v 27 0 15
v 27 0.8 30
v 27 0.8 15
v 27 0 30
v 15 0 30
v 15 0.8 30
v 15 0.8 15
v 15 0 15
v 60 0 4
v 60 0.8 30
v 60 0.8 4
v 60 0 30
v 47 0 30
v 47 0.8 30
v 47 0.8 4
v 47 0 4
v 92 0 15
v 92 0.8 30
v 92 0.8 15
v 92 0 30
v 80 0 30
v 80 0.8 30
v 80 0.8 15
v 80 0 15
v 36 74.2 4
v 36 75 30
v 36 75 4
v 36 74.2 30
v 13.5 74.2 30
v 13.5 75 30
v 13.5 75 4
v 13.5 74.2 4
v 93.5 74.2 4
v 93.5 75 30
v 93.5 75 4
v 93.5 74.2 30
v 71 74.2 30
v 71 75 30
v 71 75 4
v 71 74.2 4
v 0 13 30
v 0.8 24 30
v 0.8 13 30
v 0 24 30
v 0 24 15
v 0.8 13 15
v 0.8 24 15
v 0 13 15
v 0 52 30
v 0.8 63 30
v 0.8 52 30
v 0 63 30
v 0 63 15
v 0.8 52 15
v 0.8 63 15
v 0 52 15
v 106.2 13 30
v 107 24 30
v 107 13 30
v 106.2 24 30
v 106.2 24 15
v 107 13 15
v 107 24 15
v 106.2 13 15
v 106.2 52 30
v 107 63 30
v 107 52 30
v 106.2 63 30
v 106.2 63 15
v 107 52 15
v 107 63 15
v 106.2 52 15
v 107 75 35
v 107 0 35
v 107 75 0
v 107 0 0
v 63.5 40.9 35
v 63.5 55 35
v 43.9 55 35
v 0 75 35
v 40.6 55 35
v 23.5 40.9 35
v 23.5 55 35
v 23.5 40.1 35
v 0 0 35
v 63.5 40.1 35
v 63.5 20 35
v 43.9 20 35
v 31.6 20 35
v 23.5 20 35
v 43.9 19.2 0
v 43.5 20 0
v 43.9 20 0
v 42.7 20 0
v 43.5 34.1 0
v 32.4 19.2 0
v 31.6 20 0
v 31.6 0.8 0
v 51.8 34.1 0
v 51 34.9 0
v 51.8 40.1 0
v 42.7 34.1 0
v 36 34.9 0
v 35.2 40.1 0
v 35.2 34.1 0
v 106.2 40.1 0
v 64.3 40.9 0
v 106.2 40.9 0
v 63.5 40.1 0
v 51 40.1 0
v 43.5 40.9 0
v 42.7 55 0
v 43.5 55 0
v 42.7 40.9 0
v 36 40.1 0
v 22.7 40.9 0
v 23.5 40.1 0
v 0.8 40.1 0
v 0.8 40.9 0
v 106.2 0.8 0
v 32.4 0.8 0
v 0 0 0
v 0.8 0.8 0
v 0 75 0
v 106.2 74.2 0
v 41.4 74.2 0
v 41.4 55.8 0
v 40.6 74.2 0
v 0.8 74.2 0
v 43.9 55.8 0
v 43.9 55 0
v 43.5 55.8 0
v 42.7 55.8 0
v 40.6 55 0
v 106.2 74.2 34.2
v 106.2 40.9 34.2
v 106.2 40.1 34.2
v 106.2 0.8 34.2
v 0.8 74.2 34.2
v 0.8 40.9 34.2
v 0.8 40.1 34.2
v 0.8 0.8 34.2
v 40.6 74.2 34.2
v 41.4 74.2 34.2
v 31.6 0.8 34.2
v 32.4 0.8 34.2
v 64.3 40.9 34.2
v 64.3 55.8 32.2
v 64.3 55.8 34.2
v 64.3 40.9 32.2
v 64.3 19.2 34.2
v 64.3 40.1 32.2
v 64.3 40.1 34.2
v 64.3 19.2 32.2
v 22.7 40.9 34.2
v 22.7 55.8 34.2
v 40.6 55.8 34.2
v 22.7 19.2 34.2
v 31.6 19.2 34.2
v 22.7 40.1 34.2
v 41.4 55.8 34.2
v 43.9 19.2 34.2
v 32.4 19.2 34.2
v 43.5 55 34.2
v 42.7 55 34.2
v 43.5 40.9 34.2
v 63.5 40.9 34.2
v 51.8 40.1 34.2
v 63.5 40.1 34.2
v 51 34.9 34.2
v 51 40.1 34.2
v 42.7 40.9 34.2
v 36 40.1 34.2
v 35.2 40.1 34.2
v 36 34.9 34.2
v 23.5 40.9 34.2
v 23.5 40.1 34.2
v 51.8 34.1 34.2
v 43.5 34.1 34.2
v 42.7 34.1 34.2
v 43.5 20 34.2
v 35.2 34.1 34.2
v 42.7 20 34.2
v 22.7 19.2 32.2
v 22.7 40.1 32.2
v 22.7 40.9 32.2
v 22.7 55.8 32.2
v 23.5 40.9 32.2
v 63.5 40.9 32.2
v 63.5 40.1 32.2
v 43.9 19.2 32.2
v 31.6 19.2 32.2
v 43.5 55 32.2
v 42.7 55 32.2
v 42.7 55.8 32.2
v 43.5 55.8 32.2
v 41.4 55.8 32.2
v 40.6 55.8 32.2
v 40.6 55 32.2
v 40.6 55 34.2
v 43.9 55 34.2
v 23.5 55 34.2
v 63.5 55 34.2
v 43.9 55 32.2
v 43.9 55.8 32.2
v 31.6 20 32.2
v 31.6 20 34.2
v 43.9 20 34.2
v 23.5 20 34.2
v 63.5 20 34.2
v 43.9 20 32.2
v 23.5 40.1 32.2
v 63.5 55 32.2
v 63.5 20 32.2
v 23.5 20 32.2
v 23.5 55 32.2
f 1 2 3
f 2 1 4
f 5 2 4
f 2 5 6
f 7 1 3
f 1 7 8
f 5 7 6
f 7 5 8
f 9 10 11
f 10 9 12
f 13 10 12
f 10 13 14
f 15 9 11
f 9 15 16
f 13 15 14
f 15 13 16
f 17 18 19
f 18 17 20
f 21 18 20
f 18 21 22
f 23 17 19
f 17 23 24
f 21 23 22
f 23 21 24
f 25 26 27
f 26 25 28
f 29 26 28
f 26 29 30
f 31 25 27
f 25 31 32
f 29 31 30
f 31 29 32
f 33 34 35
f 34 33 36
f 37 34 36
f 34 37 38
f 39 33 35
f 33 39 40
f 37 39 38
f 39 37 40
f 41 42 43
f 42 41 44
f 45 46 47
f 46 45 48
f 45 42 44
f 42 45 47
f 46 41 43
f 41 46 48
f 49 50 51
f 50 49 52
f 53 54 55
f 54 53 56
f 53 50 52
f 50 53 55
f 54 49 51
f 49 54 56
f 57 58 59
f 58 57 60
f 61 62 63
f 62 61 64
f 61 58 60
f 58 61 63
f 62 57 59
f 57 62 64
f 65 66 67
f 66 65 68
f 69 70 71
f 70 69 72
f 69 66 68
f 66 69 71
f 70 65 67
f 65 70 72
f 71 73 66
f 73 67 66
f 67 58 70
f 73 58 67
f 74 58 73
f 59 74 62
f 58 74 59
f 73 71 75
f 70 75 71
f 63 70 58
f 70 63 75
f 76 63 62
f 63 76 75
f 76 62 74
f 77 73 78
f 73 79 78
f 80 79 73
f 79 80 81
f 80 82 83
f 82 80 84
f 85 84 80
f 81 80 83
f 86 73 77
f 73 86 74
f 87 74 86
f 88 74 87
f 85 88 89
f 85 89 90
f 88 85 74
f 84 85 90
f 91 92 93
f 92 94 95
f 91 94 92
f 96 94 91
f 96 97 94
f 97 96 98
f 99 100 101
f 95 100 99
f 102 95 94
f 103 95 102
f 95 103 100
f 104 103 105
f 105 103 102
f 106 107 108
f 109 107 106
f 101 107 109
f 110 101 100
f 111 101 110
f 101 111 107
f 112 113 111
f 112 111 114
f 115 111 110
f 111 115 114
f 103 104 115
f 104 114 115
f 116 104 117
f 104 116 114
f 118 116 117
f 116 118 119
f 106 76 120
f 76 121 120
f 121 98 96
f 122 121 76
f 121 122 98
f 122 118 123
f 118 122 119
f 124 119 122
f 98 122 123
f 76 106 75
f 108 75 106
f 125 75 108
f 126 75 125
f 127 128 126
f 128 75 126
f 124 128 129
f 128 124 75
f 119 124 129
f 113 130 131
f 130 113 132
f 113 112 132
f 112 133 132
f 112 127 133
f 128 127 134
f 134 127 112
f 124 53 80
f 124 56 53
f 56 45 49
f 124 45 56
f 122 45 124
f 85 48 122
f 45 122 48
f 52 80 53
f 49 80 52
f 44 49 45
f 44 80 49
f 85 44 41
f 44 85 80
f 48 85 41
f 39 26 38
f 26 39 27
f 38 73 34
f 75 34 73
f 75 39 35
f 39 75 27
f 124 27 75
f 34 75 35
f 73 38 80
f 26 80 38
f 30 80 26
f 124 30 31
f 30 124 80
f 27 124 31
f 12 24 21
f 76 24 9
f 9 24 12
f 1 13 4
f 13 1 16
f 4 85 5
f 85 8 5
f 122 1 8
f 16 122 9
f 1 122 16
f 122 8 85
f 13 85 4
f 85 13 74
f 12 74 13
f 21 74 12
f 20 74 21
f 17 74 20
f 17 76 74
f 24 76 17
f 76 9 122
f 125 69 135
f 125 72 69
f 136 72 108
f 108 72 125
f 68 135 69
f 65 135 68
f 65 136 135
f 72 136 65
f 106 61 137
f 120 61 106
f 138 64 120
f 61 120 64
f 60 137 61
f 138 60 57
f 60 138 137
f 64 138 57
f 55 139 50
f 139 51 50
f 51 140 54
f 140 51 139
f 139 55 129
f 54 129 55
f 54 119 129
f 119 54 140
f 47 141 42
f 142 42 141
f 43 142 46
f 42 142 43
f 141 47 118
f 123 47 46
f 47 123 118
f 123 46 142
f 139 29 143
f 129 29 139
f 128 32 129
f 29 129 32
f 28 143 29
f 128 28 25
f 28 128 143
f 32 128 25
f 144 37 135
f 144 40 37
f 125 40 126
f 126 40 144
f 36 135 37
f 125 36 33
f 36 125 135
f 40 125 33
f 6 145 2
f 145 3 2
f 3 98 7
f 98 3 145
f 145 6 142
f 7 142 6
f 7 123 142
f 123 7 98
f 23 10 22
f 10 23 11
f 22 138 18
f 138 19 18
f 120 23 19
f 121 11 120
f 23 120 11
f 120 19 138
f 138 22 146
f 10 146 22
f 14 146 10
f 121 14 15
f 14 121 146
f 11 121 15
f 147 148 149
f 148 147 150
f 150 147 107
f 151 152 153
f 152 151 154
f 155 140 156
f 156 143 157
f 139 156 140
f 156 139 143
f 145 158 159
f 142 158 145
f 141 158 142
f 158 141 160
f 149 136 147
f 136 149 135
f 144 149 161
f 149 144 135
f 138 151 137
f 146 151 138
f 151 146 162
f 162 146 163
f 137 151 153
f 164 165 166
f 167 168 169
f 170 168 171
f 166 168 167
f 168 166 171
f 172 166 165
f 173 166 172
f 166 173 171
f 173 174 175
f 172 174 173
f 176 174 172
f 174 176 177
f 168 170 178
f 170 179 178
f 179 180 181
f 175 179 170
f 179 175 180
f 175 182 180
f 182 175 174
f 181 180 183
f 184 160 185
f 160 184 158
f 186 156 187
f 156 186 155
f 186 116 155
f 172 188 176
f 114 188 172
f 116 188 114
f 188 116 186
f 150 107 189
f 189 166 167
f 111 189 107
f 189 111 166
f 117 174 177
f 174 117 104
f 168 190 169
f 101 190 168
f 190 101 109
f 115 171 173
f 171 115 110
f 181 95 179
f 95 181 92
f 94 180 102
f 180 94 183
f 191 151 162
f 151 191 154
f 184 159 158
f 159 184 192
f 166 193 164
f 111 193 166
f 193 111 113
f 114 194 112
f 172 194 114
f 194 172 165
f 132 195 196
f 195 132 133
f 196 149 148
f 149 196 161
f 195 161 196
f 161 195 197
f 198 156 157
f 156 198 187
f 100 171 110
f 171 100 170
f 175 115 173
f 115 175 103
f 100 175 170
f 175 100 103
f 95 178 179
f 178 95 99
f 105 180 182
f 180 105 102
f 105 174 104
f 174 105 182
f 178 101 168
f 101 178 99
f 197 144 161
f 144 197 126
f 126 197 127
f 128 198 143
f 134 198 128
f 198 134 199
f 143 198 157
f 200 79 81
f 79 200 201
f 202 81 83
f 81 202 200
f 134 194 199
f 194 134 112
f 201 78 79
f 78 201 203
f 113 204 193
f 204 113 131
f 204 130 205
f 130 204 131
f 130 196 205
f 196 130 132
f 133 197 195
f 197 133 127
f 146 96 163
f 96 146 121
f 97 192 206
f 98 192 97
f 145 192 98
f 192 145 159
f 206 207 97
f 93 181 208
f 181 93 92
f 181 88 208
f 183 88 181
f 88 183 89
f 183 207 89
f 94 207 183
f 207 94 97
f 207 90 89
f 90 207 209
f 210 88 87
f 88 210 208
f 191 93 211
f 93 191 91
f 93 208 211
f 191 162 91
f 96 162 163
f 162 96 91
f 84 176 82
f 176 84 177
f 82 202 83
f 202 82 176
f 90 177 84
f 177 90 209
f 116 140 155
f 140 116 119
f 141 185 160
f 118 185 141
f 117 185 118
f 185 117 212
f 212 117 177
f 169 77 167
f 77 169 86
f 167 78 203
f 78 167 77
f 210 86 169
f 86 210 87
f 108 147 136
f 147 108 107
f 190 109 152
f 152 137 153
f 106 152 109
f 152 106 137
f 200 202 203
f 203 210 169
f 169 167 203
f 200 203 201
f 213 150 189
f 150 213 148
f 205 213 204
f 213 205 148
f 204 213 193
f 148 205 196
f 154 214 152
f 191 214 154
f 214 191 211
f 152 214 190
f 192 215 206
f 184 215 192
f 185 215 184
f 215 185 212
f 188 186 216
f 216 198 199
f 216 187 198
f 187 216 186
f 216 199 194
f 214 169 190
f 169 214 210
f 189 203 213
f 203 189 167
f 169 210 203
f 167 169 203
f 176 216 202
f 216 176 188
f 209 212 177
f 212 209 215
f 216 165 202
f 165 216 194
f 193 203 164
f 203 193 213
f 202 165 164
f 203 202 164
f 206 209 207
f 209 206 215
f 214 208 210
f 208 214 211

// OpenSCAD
// file: house_data.scad
room_width  = 107;
room_depth  = 75;
room_height = 35;
front_windows  = [[15,15,12,15], [47,4,13,26], [80,15,12,15]];
back_windows   = [[13.5,4,22.5,26], [71,4,22.5,26]];
left_windows   = [[13,15,11,15], [52,15,11,15]];
right_windows  = [[13,15,11,15], [52,15,11,15]];
has_licht      = true;
licht_offset   = [-10, 0];
licht_rotation = 0;
dach           = [];
front_wall_pos = [32];
back_wall_pos  = [41];
left_wall_pos  = [40.5];
right_wall_pos = [40.5];
// main file
// Hausmaske mit Fenster- und Türöffnungen aus CSV-Daten
// Aufruf: python3 parse_house.py sample.csv > house_data.scad
// Dann diese Datei in OpenSCAD öffnen.

include <house_data.scad>

wall_t     = 0.8;   // Wandstärke [mm]
licht_w    = 40;  // Dachausschnitt Breite [mm]
licht_d    = 35;  // Dachausschnitt Tiefe [mm]
board_slot = 3;   // Versatz der X-Wand vom Mittelpunkt [mm]
board_cap  = 15;  // Breite der kurzen Querwand [mm]

licht_x = (room_width - licht_w) / 2 + licht_offset[0];
licht_y = (room_depth - licht_d) / 2 + licht_offset[1];

licht_cx = licht_x + licht_w / 2;
licht_cy = licht_y + licht_d / 2;

module licht_transform() {
    translate([licht_cx, licht_cy, 0])
        rotate([0, 0, licht_rotation])
            translate([-licht_cx, -licht_cy, 0])
                children();
}

// Alle Öffnungen einer Wand als Subtraktionskörper.
// windows = [[x_start, y_start, x_size, y_size], ...]
// x = Position entlang der Wandlänge (von links außen), y = Höhe ab Boden
module front_cuts(windows) {
    for (w = windows)
        translate([w[0], -0.1, w[1]])
            cube([w[2], wall_t + 0.2, w[3]]);
}
module back_cuts(windows) {
    for (w = windows)
        translate([w[0], room_depth - wall_t - 0.1, w[1]])
            cube([w[2], wall_t + 0.2, w[3]]);
}
module left_cuts(windows) {
    for (w = windows)
        translate([-0.1, w[0], w[1]])
            cube([wall_t + 0.2, w[2], w[3]]);
}
module right_cuts(windows) {
    for (w = windows)
        translate([room_width - wall_t - 0.1, w[0], w[1]])
            cube([wall_t + 0.2, w[2], w[3]]);
}

// Dachausschnitte: [[x, y, breite, tiefe], ...] – Ursprung vorne links
module dach_cuts() {
    for (d = dach)
        translate([d[0], d[1], room_height - wall_t - 0.1])
            cube([d[2], d[3], wall_t + 0.2]);
}

// Board: Kreuzstruktur zentriert auf den Dachausschnitt.
// Koordinatenursprung = vorne links des Boards (licht_x - wall_t, licht_y - wall_t).
module board_main_walls() {
    bw = licht_w + 2 * wall_t;
    bd = licht_d + 2 * wall_t;
    cx = bw / 2;
    cy = bd / 2;
    h  = room_height - wall_t;

    // X-Wand: volle Breite, board_slot mm von Mitte in +Y
    translate([0, cy + board_slot - wall_t / 2, 0])
        cube([bw, wall_t, h]);

    // Y-Wand: durchgehend (keine Lücke, da kein Board eingesteckt wird)
    translate([cx - wall_t, 0, 0])
        cube([wall_t, bd, h]);
}

module board() {
    bw = licht_w + 2 * wall_t;
    bd = licht_d + 2 * wall_t;
    cx = bw / 2;
    cy = bd / 2;
    h  = room_height - wall_t;

    // X-Wand: volle Breite, board_slot mm von Mitte in +Y
    translate([0, cy + board_slot - wall_t / 2, 0])
        cube([bw, wall_t, h]);

    // Y-Wand: mit Lücke für den Schlitz der X-Wand
    translate([cx - wall_t, 0, 0])
        cube([wall_t, bd / 2 - board_slot, h]);
    translate([cx - wall_t, bd / 2 + board_slot, 0])
        cube([wall_t, bd / 2 - board_slot, h]);

    // kurze Querwand: board_cap mm breit, board_slot mm von Mitte in -Y
    translate([cx - board_cap / 2, cy - board_slot - wall_t / 2, 0])
        cube([board_cap, wall_t, h]);

    // linke Stirnwand
    translate([cx - board_cap / 2 - wall_t, cy - board_slot - wall_t / 2, 0])
        cube([wall_t, 2 * board_slot + wall_t, h]);

    // rechte Stirnwand
    translate([cx + board_cap / 2, cy - board_slot - wall_t / 2, 0])
        cube([wall_t, 2 * board_slot + wall_t, h]);
}

// Wandansatz von Außenwand bis zur Dachöffnungskante,
// dann entlang der Kante zur nächsten Board-Wand.

module walls_from_back(positions) {
    ey = licht_y + licht_d;  // hintere Lichtöffnungskante
    for (p = positions) {
        // senkrecht: Außenwand → Lichtöffnungskante
        translate([p - wall_t/2, ey, 0])
            cube([wall_t, room_depth - wall_t - ey, room_height]);
        // entlang Kante: p → Board Y-Wand (licht_cx)
        translate([min(p, licht_cx) - wall_t/2, ey, 0])
            cube([abs(p - licht_cx) + wall_t, wall_t, room_height]);
    }
}

module walls_from_front(positions) {
    ey = licht_y;  // vordere Lichtöffnungskante
    for (p = positions) {
        // senkrecht: Außenwand → Lichtöffnungskante
        translate([p - wall_t/2, wall_t, 0])
            cube([wall_t, ey - wall_t, room_height]);
        // entlang Kante: p → Board Y-Wand (licht_cx)
        translate([min(p, licht_cx) - wall_t/2, ey - wall_t, 0])
            cube([abs(p - licht_cx) + wall_t, wall_t, room_height]);
    }
}

module walls_from_left(positions) {
    ex = licht_x;  // linke Lichtöffnungskante
    bx = licht_cy + board_slot;  // Board X-Wand (Weltkoordinate Y)
    for (p = positions) {
        // senkrecht: Außenwand → Lichtöffnungskante
        translate([wall_t, p - wall_t/2, 0])
            cube([ex - wall_t, wall_t, room_height]);
        // entlang Kante: p → Board X-Wand
        translate([ex - wall_t, min(p, bx) - wall_t/2, 0])
            cube([wall_t, abs(p - bx) + wall_t, room_height]);
    }
}

module walls_from_right(positions) {
    ex = licht_x + licht_w;  // rechte Lichtöffnungskante
    bx = licht_cy + board_slot;  // Board X-Wand (Weltkoordinate Y)
    for (p = positions) {
        // senkrecht: Außenwand → Lichtöffnungskante
        translate([ex, p - wall_t/2, 0])
            cube([room_width - wall_t - ex, wall_t, room_height]);
        // entlang Kante: p → Board X-Wand
        translate([ex, min(p, bx) - wall_t/2, 0])
            cube([wall_t, abs(p - bx) + wall_t, room_height]);
    }
}

union() {
    // Wände: Hohlbox (Außenhülle minus Innenraum) mit Öffnungen
    difference() {
        cube([room_width, room_depth, room_height]);
        translate([wall_t, wall_t, -0.5])
            cube([
                room_width  - 2 * wall_t,
                room_depth  - 2 * wall_t,
                room_height + 1
            ]);
        front_cuts(front_windows);
        back_cuts(back_windows);
        left_cuts(left_windows);
        right_cuts(right_windows);
        // Wand entfernen wenn keine Fenster definiert
        if (len(front_windows)  == 0)
            translate([-0.1, -0.1, -0.1])
                cube([room_width + 0.2, wall_t + 0.2, room_height + 0.2]);
        if (len(back_windows)   == 0)
            translate([-0.1, room_depth - wall_t - 0.1, -0.1])
                cube([room_width + 0.2, wall_t + 0.2, room_height + 0.2]);
        if (len(left_windows)   == 0)
            translate([-0.1, -0.1, -0.1])
                cube([wall_t + 0.2, room_depth + 0.2, room_height + 0.2]);
        if (len(right_windows)  == 0)
            translate([room_width - wall_t - 0.1, -0.1, -0.1])
                cube([wall_t + 0.2, room_depth + 0.2, room_height + 0.2]);
    }
    // Board im Dachausschnitt zentriert; ohne Licht nur die beiden Hauptwände
    licht_transform()
        translate([licht_x - wall_t, licht_y - wall_t, 0])
            color([1,0,0])
                if (has_licht) board(); else board_main_walls();
    // Ansatz-Innenwände von den Außenwänden
    color([0.5,0.5,0.8]) {
        walls_from_back(back_wall_pos);
        walls_from_front(front_wall_pos);
        walls_from_left(left_wall_pos);
        walls_from_right(right_wall_pos);
    }
    // Decke mit Lichtausschnitt (kein Boden)
    difference() {
        translate([0, 0, room_height - wall_t])
            cube([room_width, room_depth, wall_t]);
        if (has_licht)
            licht_transform()
                translate([licht_x, licht_y, room_height - wall_t - 0.1])
                    cube([licht_w, licht_d, wall_t + 0.2]);
        dach_cuts();
    }
    // Rand um den Dachausschnitt: Wandstärke breit, 2mm hoch (Innenseite)
    if (has_licht)
        licht_transform()
            translate([licht_x - wall_t, licht_y - wall_t, room_height - wall_t - 2])
                difference() {
                    cube([licht_w + 2 * wall_t, licht_d + 2 * wall_t, 2]);
                    translate([wall_t, wall_t, -0.1])
                        cube([licht_w, licht_d, 2.2]);
                }
}
